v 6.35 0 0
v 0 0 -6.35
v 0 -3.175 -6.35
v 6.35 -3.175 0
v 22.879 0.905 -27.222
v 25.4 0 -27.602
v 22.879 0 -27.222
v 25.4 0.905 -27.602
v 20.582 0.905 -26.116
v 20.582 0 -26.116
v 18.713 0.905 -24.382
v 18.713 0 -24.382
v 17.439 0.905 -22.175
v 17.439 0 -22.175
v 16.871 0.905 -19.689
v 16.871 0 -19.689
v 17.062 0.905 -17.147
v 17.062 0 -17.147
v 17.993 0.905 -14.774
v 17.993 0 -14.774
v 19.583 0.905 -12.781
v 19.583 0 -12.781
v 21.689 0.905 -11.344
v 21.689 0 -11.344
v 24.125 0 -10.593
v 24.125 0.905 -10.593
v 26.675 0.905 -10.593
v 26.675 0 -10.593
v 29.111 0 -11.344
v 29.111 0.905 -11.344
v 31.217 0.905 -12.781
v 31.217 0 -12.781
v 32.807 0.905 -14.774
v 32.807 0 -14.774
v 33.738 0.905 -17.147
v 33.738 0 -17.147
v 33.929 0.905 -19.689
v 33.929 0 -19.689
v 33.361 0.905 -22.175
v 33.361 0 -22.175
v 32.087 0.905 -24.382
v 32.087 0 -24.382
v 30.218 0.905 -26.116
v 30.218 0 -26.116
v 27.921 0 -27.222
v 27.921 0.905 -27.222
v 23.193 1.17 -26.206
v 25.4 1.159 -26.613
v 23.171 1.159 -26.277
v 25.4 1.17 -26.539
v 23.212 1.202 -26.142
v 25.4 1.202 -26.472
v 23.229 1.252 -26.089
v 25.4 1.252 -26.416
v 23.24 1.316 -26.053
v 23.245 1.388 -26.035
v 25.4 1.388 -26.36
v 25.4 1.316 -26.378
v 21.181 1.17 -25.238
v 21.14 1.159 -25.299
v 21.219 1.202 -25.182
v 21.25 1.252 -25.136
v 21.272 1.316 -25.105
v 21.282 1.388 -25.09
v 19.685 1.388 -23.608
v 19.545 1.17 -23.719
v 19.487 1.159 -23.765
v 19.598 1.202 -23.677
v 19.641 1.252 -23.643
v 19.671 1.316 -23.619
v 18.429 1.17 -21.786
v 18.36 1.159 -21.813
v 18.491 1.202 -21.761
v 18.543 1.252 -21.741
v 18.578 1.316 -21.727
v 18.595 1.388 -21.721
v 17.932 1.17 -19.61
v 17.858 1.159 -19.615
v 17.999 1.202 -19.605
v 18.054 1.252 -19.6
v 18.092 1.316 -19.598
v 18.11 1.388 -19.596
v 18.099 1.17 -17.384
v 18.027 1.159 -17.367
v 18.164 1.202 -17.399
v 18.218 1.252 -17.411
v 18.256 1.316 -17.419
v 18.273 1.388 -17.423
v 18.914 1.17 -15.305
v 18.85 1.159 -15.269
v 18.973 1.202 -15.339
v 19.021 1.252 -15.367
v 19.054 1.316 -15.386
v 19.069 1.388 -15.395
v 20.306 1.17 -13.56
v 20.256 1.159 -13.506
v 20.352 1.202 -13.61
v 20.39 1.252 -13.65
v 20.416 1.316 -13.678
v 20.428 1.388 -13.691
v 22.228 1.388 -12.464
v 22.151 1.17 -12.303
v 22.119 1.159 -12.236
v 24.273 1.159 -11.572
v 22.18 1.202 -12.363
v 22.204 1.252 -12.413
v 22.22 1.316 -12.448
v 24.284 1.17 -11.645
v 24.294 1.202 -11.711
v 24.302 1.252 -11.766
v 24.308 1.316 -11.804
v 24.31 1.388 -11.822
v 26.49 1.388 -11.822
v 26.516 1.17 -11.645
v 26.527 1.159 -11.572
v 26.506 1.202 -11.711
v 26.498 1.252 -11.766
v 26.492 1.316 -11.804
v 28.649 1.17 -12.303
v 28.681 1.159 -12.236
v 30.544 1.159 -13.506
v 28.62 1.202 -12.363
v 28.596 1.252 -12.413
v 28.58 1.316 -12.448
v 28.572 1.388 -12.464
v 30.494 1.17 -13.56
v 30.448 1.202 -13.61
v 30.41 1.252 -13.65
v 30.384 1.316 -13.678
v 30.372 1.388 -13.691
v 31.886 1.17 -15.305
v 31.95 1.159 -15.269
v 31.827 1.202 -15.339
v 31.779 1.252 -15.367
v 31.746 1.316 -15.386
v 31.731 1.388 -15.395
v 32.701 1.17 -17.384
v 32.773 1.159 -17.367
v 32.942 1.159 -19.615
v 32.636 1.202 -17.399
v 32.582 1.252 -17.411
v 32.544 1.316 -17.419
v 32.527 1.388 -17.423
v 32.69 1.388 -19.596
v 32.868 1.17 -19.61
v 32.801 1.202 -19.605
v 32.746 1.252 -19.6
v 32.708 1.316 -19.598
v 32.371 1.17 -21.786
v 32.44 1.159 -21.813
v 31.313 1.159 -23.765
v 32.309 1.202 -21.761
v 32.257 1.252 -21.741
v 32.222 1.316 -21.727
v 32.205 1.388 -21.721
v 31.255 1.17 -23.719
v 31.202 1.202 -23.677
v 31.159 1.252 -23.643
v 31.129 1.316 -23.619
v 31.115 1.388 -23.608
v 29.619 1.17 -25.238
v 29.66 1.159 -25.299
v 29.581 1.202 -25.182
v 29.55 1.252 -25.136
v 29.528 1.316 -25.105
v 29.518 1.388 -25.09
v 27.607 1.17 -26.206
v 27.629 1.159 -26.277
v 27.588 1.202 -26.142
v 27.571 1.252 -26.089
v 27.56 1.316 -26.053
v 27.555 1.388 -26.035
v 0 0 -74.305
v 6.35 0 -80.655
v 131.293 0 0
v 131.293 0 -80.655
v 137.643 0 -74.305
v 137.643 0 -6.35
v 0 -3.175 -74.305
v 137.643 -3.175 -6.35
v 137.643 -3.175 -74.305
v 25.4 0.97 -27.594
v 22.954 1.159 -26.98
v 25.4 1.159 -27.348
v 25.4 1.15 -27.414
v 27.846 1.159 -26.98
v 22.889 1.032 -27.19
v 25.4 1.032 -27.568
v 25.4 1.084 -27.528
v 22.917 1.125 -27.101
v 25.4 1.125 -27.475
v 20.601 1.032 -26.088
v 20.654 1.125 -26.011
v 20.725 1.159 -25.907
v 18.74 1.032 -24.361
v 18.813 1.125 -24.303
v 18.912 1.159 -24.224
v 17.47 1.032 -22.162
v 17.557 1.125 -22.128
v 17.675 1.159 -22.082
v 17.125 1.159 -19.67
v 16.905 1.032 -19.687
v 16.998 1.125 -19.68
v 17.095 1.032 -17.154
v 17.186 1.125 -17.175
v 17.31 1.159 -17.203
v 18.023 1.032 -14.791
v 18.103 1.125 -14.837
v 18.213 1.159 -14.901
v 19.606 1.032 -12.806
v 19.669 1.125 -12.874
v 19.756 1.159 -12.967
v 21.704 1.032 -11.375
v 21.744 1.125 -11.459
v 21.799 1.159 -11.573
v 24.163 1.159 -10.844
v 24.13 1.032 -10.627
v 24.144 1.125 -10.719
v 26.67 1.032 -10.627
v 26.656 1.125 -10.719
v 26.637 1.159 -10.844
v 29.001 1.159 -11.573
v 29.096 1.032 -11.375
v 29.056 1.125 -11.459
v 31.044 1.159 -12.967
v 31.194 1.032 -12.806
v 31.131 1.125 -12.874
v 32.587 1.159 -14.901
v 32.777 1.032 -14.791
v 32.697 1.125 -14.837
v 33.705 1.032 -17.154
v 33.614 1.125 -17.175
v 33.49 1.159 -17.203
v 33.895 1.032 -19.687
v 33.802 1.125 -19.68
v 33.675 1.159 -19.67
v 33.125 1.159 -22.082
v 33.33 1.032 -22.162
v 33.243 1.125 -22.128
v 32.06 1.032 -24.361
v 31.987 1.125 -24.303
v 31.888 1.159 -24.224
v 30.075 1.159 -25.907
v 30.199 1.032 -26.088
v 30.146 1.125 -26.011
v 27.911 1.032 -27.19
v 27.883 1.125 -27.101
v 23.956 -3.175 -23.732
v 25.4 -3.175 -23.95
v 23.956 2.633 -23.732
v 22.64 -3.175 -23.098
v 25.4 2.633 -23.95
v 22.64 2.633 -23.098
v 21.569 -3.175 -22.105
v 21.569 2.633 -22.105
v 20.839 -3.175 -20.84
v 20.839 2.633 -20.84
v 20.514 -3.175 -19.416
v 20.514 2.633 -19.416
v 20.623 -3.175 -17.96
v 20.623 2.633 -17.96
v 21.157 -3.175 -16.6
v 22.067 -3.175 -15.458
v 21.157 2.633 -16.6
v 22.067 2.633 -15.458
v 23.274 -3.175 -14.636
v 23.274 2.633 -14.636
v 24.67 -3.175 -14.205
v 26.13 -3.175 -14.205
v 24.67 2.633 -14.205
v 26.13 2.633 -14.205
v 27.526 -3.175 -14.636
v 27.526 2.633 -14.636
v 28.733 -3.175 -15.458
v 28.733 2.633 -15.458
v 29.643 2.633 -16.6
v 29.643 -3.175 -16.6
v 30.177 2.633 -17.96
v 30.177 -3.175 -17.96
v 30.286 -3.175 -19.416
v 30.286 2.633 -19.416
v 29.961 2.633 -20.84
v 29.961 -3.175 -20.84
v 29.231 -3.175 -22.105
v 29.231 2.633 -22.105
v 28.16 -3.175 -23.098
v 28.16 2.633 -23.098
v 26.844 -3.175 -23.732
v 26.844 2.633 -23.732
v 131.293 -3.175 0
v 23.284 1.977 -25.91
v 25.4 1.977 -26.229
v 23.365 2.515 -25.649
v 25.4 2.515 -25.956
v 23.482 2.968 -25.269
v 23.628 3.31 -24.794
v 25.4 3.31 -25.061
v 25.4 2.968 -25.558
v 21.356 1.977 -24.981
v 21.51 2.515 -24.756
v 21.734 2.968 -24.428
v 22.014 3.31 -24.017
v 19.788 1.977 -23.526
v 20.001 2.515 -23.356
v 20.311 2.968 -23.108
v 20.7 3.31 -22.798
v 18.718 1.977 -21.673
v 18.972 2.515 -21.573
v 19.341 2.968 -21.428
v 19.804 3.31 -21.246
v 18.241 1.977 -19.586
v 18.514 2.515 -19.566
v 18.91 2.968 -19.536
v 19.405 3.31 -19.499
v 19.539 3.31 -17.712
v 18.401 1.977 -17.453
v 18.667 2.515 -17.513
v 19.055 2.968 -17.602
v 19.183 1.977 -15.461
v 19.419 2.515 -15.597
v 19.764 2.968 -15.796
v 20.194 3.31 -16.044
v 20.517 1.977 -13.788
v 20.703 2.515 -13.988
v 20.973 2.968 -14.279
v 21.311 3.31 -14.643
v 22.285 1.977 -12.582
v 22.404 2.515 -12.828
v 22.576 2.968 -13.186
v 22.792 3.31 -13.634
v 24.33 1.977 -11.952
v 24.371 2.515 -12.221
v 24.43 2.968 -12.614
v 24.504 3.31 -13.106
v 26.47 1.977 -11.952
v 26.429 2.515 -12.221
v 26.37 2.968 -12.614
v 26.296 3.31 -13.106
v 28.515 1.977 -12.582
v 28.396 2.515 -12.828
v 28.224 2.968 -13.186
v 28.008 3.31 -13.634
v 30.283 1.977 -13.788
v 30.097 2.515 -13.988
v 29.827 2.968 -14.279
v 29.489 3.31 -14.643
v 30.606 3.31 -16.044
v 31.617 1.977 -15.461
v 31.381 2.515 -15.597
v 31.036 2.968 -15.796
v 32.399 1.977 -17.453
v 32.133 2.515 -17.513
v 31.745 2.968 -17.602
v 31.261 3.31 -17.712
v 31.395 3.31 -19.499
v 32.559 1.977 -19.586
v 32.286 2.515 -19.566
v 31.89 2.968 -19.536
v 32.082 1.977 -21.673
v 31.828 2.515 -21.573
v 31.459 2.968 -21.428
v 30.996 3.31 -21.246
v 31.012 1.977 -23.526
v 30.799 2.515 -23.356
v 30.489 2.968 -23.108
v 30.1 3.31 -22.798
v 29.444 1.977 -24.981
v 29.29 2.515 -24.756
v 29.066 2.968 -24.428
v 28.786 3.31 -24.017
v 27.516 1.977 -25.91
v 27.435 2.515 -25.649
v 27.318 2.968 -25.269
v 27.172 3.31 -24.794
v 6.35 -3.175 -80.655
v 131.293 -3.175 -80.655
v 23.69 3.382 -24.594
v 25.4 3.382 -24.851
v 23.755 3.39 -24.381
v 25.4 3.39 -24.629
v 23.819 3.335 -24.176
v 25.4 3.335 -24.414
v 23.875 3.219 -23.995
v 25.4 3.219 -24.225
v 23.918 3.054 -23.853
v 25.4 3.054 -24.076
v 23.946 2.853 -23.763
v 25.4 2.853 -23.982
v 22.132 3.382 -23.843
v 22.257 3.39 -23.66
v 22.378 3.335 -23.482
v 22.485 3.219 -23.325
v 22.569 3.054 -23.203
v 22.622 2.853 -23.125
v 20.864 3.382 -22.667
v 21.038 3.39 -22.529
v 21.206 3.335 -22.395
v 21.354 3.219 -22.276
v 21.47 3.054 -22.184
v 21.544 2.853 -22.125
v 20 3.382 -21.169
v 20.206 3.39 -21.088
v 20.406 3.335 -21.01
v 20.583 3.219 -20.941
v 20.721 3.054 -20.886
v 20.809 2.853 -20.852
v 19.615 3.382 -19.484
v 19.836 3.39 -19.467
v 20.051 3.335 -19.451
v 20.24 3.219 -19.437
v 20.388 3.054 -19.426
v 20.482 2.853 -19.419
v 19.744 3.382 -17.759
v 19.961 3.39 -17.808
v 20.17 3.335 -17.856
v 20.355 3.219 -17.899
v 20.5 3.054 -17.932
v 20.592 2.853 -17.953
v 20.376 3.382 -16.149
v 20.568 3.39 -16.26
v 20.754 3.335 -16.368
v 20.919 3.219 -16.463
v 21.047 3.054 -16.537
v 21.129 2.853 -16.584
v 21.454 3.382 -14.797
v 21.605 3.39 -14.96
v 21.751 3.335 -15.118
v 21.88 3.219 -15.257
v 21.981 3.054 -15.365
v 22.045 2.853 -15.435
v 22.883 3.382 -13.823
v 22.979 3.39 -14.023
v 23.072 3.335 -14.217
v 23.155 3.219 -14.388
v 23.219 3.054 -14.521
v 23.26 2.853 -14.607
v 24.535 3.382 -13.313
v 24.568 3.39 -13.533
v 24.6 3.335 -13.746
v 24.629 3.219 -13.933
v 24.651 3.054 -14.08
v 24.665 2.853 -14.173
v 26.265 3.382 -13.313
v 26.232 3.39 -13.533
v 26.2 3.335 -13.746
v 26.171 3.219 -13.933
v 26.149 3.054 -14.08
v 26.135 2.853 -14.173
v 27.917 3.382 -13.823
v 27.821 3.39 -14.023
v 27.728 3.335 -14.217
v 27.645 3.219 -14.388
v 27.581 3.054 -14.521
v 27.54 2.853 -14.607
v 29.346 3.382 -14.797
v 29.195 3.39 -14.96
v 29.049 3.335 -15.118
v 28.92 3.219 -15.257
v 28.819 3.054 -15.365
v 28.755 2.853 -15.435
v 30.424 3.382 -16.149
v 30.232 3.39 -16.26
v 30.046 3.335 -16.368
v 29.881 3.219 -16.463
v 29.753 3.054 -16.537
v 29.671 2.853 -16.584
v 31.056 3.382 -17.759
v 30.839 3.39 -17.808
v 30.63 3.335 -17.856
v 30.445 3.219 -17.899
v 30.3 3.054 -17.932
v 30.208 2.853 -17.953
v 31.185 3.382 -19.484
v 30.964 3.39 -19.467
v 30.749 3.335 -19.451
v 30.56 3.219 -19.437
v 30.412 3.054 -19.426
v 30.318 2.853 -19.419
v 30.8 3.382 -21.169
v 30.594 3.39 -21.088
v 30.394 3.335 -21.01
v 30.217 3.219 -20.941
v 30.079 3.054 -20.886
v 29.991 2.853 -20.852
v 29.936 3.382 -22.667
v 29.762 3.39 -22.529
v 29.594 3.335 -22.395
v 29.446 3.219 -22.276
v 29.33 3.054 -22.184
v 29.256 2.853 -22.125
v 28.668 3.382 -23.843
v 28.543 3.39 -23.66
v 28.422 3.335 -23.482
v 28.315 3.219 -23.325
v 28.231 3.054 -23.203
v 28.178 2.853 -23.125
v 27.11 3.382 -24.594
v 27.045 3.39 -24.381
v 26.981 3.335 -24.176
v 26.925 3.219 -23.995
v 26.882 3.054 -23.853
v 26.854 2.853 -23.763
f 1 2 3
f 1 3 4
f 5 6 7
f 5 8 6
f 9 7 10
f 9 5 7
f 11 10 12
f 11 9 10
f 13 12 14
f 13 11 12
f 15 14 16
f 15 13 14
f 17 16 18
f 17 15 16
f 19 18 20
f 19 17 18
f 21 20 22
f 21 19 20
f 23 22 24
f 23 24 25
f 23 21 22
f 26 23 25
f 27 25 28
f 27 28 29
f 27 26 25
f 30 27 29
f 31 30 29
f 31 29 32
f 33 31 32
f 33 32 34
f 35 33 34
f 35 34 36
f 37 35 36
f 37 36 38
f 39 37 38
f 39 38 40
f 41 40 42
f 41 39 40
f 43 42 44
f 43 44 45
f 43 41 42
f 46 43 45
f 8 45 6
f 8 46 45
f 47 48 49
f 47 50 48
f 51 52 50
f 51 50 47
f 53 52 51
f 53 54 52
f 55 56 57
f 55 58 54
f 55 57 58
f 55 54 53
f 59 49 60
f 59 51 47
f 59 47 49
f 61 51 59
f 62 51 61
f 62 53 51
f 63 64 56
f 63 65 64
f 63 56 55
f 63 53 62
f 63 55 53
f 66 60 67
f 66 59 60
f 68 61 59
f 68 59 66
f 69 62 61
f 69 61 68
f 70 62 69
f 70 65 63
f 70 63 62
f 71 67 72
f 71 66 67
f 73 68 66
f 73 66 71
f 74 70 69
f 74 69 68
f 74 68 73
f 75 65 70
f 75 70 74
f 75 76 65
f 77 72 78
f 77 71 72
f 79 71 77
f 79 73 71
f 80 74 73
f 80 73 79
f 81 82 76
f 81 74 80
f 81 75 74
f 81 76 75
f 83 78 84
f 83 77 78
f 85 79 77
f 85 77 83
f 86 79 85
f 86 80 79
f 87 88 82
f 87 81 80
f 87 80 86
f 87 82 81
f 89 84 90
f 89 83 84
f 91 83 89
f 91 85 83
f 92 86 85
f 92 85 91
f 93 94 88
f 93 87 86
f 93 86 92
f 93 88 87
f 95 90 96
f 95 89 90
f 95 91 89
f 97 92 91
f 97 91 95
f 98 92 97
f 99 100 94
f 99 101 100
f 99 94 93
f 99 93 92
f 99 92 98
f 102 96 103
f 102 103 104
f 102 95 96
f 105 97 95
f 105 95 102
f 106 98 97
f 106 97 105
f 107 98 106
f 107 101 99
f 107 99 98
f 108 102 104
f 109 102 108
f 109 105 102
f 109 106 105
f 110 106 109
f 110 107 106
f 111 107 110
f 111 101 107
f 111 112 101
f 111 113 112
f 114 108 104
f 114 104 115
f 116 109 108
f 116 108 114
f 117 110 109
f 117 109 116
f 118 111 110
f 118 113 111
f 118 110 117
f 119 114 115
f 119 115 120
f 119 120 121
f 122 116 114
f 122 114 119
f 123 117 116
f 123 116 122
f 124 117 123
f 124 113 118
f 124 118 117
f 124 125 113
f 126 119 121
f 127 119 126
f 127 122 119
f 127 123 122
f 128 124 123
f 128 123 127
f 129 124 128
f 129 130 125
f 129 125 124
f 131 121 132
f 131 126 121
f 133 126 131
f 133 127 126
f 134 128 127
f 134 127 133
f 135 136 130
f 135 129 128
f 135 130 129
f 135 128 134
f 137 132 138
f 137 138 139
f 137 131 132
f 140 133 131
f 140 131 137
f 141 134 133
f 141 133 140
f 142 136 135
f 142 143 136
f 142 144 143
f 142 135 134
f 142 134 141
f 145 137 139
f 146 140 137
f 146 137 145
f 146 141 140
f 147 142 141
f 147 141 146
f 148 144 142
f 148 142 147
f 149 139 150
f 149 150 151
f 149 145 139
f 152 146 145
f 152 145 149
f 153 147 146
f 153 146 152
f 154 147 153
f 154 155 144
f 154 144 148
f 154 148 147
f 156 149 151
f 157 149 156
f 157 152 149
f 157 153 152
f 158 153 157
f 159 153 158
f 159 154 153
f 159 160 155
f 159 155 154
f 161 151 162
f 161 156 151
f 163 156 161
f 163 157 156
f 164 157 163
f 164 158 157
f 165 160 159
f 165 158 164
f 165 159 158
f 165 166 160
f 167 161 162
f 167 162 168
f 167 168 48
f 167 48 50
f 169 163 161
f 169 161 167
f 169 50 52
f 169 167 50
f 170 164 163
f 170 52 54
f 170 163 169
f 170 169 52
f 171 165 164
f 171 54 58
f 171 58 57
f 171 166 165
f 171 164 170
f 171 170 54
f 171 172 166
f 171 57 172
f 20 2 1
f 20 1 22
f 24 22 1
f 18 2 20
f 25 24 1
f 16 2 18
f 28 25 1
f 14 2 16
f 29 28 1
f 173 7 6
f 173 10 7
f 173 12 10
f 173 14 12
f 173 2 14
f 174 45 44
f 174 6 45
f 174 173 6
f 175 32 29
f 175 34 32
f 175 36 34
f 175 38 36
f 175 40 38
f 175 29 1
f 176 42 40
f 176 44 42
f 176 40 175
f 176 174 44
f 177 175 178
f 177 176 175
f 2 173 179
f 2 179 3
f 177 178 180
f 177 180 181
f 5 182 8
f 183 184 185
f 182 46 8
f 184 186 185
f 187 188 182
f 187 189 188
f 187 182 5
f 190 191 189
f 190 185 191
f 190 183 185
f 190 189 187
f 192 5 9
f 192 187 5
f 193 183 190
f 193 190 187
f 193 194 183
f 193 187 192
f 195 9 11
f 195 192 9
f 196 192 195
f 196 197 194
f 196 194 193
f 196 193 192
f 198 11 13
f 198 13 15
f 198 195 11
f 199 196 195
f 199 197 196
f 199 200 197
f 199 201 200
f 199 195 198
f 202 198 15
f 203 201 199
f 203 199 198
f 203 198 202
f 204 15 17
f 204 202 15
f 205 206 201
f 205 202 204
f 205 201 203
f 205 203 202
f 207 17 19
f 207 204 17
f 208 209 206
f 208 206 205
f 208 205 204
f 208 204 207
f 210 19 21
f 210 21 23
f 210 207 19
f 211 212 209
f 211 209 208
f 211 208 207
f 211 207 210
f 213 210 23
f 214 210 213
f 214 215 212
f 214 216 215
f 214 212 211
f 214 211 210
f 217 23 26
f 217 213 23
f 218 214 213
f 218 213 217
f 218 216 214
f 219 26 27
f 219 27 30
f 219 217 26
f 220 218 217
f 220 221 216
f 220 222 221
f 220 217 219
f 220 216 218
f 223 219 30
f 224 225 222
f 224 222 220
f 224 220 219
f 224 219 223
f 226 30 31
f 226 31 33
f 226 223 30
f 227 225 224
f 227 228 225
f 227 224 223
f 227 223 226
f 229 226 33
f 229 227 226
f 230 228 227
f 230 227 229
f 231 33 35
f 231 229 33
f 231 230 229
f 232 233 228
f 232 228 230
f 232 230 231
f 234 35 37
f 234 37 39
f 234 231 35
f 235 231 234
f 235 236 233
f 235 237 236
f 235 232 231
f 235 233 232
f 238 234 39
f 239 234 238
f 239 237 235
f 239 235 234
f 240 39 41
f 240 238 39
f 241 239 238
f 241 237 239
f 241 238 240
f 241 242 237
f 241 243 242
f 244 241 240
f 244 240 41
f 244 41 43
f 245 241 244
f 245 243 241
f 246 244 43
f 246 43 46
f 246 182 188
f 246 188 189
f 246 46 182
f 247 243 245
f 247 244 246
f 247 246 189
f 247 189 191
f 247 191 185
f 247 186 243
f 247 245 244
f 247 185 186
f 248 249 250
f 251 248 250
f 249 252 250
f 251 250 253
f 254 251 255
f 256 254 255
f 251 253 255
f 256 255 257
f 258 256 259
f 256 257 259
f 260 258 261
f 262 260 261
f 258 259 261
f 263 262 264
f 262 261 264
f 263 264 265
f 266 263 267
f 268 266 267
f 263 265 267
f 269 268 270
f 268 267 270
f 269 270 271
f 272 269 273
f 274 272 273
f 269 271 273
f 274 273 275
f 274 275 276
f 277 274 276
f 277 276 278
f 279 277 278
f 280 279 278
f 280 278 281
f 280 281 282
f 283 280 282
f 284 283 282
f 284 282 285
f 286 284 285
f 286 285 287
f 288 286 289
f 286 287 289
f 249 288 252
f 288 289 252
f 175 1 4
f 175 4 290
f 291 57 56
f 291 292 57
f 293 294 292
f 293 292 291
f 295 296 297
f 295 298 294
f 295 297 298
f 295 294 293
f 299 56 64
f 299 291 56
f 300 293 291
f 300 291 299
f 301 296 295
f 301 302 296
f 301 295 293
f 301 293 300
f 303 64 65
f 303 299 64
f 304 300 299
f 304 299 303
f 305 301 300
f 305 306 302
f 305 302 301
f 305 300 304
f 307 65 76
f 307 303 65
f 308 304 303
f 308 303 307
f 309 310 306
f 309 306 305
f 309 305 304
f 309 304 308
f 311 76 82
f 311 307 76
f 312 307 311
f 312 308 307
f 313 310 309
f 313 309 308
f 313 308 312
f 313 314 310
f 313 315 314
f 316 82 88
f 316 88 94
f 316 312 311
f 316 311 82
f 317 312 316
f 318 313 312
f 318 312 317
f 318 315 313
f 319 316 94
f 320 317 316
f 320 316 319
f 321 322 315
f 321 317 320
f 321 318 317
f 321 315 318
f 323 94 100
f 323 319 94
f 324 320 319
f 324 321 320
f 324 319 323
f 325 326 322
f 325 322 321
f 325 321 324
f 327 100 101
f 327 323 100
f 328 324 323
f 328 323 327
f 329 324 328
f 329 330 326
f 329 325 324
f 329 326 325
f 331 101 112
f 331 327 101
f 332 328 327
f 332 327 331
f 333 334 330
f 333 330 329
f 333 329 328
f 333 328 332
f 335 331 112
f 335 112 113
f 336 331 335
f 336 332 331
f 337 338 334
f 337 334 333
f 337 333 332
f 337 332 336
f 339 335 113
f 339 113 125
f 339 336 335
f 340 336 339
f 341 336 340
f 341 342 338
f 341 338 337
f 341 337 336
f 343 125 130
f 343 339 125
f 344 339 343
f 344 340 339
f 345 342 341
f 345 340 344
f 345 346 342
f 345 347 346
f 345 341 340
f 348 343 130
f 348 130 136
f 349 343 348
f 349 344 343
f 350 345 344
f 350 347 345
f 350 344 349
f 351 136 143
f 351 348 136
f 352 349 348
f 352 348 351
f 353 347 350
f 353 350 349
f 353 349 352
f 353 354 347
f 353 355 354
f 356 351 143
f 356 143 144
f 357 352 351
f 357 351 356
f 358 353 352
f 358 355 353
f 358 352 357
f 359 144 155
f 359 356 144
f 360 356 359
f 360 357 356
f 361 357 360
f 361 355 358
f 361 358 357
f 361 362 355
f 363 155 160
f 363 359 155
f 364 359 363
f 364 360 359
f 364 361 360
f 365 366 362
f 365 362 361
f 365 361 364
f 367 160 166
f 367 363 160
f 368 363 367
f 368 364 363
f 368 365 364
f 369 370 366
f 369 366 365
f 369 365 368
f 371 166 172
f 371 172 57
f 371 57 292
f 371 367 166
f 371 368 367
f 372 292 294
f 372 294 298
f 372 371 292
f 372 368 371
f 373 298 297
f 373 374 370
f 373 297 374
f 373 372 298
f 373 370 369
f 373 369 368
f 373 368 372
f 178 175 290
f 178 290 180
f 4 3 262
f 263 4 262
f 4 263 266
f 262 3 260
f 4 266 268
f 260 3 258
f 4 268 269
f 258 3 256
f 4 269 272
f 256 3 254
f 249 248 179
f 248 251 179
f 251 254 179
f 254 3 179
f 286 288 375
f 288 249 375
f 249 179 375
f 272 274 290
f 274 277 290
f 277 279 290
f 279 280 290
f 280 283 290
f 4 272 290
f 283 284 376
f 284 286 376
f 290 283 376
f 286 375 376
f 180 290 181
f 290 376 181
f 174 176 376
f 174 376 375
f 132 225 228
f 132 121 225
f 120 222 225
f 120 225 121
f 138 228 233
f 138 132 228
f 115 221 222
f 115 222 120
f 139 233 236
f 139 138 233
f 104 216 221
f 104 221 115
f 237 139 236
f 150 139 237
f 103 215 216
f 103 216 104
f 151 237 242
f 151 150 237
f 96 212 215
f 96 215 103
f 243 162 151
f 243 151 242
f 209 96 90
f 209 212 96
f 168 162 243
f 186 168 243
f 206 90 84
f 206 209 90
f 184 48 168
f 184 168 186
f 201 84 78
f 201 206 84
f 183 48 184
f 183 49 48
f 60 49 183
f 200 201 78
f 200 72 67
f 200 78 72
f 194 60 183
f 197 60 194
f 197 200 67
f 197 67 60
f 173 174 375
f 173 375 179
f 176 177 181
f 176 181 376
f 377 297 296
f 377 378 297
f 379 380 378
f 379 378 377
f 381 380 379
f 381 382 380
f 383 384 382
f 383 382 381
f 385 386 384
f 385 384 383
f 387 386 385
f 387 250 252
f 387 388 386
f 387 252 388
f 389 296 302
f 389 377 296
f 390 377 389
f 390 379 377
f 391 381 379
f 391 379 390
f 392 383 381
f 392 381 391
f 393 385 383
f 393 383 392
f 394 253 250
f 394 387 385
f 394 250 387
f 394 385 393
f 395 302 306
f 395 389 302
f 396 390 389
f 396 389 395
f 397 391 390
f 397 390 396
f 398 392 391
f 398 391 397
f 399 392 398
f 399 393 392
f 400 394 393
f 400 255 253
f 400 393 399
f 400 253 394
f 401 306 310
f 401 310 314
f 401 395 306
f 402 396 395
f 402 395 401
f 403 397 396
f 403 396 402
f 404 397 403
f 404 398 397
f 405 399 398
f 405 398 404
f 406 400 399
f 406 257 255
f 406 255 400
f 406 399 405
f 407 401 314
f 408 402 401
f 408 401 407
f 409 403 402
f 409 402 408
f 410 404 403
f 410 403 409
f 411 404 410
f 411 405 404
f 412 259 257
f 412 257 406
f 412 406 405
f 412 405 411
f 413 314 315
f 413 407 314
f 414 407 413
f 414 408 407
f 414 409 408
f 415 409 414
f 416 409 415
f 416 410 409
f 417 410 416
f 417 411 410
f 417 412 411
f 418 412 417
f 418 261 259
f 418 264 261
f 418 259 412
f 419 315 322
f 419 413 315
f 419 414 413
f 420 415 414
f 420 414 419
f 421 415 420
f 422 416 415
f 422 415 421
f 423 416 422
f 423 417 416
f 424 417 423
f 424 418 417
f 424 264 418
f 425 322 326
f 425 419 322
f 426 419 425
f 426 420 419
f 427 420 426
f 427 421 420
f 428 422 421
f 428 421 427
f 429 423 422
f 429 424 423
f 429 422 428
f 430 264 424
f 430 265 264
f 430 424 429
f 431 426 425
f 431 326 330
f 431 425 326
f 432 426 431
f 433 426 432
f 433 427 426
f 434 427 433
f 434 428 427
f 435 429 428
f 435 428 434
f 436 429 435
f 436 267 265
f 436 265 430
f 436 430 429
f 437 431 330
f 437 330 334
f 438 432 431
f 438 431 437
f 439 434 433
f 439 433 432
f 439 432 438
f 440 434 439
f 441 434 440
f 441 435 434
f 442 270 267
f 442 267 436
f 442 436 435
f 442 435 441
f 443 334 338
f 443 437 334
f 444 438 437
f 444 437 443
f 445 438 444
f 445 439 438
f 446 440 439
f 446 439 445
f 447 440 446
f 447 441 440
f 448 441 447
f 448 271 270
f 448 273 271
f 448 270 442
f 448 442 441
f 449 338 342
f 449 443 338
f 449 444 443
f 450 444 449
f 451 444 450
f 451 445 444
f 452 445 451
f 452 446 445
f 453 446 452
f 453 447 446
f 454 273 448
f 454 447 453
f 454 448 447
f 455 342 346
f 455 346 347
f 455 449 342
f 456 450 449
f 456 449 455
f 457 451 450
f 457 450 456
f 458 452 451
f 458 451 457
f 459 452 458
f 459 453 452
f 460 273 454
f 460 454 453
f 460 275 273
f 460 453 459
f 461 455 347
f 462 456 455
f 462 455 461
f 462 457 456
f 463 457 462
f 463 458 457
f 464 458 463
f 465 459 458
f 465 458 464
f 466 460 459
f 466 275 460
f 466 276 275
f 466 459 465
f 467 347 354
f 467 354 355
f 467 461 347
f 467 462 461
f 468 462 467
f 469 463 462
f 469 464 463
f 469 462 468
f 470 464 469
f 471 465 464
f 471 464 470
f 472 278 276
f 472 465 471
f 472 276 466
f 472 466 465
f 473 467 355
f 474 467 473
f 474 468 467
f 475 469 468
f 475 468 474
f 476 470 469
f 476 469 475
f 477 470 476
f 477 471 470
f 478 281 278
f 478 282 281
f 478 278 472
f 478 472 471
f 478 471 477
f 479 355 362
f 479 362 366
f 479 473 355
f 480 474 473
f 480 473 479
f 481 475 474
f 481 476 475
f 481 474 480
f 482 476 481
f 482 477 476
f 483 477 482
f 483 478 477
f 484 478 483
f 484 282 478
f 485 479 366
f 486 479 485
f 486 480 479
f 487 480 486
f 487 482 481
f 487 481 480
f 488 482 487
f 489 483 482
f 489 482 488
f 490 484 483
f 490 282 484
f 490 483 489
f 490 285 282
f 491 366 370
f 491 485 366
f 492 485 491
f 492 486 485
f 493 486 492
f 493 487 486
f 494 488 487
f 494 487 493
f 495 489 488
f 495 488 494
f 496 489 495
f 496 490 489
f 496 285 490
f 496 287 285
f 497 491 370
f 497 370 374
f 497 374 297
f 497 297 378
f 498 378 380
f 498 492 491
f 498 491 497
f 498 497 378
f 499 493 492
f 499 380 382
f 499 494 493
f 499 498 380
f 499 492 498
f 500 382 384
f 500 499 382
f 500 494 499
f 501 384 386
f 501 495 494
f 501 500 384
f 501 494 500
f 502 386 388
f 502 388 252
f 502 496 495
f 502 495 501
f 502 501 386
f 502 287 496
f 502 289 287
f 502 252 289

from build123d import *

# Parameters (mm, degrees)
EXTRUDE1_DEPTH = 3.175
SKETCH5_R      = 4.899523771
EXTRUDE2_DEPTH = 6.9215


with BuildPart() as part:
    # Sketch1 → Extrude1 (new body)
    with BuildSketch(Plane(origin=(0, 0, 0), x_dir=(1, 0, 0), z_dir=(0, 1, 0))):
        Polygon((131.293364516, 0), (137.643364516, 6.35), (137.643364516, 74.305125285), (131.293364516, 80.655125285), (6.35, 80.655125285), (0, 74.305125285), (0, 6.35), (6.35, 0), align=None)
    extrude(amount=-EXTRUDE1_DEPTH)

    # Sketch3 → Revolve1 (revolve)
    with BuildSketch(Plane.XY.offset(-19.05), mode=Mode.PRIVATE) as revolve1_sk:
        with BuildLine():
            Line((25.4, 0), (33.952460507, 0))
            Line((33.952460507, 0), (33.952460507, 0.90459086))
            ThreePointArc((33.952460507, 0.90459086), (33.87806563, 1.084195983), (33.698460507, 1.15859086))
            Line((33.698460507, 1.15859086), (32.962971663, 1.15859086))
            ThreePointArc((32.962971663, 1.15859086), (32.792104444, 1.224653653), (32.710118846, 1.388477524))
            ThreePointArc((32.710118846, 1.388477524), (32.305713436, 2.5146954), (31.411407987, 3.309760306))
            ThreePointArc((31.411407987, 3.309760306), (30.665271183, 3.28370412), (30.299523771, 2.632837093))
            Line((30.299523771, 2.632837093), (30.299523771, 1.803708053))
            Line((30.299523771, 1.803708053), (25.4, 1.803708053))
            Line((25.4, 1.803708053), (25.4, 0))
        make_face()
    revolve(revolve1_sk.sketch.rotate(Axis((25.4, 0, -19.05), (0, 1, 0)), 90), axis=Axis((25.4, 0, -19.05), (0, 1, 0)))

    # Sketch5 → Extrude2 (cut, symmetric)
    with BuildSketch(Plane(origin=(0, 0, 0), x_dir=(1, 0, 0), z_dir=(0, 1, 0))):
        with Locations(Location((25.4, 19.05, 0), (0, 0, 90))):
            Circle(SKETCH5_R)
    extrude(amount=EXTRUDE2_DEPTH, both=True, mode=Mode.SUBTRACT)


solid = part.part
